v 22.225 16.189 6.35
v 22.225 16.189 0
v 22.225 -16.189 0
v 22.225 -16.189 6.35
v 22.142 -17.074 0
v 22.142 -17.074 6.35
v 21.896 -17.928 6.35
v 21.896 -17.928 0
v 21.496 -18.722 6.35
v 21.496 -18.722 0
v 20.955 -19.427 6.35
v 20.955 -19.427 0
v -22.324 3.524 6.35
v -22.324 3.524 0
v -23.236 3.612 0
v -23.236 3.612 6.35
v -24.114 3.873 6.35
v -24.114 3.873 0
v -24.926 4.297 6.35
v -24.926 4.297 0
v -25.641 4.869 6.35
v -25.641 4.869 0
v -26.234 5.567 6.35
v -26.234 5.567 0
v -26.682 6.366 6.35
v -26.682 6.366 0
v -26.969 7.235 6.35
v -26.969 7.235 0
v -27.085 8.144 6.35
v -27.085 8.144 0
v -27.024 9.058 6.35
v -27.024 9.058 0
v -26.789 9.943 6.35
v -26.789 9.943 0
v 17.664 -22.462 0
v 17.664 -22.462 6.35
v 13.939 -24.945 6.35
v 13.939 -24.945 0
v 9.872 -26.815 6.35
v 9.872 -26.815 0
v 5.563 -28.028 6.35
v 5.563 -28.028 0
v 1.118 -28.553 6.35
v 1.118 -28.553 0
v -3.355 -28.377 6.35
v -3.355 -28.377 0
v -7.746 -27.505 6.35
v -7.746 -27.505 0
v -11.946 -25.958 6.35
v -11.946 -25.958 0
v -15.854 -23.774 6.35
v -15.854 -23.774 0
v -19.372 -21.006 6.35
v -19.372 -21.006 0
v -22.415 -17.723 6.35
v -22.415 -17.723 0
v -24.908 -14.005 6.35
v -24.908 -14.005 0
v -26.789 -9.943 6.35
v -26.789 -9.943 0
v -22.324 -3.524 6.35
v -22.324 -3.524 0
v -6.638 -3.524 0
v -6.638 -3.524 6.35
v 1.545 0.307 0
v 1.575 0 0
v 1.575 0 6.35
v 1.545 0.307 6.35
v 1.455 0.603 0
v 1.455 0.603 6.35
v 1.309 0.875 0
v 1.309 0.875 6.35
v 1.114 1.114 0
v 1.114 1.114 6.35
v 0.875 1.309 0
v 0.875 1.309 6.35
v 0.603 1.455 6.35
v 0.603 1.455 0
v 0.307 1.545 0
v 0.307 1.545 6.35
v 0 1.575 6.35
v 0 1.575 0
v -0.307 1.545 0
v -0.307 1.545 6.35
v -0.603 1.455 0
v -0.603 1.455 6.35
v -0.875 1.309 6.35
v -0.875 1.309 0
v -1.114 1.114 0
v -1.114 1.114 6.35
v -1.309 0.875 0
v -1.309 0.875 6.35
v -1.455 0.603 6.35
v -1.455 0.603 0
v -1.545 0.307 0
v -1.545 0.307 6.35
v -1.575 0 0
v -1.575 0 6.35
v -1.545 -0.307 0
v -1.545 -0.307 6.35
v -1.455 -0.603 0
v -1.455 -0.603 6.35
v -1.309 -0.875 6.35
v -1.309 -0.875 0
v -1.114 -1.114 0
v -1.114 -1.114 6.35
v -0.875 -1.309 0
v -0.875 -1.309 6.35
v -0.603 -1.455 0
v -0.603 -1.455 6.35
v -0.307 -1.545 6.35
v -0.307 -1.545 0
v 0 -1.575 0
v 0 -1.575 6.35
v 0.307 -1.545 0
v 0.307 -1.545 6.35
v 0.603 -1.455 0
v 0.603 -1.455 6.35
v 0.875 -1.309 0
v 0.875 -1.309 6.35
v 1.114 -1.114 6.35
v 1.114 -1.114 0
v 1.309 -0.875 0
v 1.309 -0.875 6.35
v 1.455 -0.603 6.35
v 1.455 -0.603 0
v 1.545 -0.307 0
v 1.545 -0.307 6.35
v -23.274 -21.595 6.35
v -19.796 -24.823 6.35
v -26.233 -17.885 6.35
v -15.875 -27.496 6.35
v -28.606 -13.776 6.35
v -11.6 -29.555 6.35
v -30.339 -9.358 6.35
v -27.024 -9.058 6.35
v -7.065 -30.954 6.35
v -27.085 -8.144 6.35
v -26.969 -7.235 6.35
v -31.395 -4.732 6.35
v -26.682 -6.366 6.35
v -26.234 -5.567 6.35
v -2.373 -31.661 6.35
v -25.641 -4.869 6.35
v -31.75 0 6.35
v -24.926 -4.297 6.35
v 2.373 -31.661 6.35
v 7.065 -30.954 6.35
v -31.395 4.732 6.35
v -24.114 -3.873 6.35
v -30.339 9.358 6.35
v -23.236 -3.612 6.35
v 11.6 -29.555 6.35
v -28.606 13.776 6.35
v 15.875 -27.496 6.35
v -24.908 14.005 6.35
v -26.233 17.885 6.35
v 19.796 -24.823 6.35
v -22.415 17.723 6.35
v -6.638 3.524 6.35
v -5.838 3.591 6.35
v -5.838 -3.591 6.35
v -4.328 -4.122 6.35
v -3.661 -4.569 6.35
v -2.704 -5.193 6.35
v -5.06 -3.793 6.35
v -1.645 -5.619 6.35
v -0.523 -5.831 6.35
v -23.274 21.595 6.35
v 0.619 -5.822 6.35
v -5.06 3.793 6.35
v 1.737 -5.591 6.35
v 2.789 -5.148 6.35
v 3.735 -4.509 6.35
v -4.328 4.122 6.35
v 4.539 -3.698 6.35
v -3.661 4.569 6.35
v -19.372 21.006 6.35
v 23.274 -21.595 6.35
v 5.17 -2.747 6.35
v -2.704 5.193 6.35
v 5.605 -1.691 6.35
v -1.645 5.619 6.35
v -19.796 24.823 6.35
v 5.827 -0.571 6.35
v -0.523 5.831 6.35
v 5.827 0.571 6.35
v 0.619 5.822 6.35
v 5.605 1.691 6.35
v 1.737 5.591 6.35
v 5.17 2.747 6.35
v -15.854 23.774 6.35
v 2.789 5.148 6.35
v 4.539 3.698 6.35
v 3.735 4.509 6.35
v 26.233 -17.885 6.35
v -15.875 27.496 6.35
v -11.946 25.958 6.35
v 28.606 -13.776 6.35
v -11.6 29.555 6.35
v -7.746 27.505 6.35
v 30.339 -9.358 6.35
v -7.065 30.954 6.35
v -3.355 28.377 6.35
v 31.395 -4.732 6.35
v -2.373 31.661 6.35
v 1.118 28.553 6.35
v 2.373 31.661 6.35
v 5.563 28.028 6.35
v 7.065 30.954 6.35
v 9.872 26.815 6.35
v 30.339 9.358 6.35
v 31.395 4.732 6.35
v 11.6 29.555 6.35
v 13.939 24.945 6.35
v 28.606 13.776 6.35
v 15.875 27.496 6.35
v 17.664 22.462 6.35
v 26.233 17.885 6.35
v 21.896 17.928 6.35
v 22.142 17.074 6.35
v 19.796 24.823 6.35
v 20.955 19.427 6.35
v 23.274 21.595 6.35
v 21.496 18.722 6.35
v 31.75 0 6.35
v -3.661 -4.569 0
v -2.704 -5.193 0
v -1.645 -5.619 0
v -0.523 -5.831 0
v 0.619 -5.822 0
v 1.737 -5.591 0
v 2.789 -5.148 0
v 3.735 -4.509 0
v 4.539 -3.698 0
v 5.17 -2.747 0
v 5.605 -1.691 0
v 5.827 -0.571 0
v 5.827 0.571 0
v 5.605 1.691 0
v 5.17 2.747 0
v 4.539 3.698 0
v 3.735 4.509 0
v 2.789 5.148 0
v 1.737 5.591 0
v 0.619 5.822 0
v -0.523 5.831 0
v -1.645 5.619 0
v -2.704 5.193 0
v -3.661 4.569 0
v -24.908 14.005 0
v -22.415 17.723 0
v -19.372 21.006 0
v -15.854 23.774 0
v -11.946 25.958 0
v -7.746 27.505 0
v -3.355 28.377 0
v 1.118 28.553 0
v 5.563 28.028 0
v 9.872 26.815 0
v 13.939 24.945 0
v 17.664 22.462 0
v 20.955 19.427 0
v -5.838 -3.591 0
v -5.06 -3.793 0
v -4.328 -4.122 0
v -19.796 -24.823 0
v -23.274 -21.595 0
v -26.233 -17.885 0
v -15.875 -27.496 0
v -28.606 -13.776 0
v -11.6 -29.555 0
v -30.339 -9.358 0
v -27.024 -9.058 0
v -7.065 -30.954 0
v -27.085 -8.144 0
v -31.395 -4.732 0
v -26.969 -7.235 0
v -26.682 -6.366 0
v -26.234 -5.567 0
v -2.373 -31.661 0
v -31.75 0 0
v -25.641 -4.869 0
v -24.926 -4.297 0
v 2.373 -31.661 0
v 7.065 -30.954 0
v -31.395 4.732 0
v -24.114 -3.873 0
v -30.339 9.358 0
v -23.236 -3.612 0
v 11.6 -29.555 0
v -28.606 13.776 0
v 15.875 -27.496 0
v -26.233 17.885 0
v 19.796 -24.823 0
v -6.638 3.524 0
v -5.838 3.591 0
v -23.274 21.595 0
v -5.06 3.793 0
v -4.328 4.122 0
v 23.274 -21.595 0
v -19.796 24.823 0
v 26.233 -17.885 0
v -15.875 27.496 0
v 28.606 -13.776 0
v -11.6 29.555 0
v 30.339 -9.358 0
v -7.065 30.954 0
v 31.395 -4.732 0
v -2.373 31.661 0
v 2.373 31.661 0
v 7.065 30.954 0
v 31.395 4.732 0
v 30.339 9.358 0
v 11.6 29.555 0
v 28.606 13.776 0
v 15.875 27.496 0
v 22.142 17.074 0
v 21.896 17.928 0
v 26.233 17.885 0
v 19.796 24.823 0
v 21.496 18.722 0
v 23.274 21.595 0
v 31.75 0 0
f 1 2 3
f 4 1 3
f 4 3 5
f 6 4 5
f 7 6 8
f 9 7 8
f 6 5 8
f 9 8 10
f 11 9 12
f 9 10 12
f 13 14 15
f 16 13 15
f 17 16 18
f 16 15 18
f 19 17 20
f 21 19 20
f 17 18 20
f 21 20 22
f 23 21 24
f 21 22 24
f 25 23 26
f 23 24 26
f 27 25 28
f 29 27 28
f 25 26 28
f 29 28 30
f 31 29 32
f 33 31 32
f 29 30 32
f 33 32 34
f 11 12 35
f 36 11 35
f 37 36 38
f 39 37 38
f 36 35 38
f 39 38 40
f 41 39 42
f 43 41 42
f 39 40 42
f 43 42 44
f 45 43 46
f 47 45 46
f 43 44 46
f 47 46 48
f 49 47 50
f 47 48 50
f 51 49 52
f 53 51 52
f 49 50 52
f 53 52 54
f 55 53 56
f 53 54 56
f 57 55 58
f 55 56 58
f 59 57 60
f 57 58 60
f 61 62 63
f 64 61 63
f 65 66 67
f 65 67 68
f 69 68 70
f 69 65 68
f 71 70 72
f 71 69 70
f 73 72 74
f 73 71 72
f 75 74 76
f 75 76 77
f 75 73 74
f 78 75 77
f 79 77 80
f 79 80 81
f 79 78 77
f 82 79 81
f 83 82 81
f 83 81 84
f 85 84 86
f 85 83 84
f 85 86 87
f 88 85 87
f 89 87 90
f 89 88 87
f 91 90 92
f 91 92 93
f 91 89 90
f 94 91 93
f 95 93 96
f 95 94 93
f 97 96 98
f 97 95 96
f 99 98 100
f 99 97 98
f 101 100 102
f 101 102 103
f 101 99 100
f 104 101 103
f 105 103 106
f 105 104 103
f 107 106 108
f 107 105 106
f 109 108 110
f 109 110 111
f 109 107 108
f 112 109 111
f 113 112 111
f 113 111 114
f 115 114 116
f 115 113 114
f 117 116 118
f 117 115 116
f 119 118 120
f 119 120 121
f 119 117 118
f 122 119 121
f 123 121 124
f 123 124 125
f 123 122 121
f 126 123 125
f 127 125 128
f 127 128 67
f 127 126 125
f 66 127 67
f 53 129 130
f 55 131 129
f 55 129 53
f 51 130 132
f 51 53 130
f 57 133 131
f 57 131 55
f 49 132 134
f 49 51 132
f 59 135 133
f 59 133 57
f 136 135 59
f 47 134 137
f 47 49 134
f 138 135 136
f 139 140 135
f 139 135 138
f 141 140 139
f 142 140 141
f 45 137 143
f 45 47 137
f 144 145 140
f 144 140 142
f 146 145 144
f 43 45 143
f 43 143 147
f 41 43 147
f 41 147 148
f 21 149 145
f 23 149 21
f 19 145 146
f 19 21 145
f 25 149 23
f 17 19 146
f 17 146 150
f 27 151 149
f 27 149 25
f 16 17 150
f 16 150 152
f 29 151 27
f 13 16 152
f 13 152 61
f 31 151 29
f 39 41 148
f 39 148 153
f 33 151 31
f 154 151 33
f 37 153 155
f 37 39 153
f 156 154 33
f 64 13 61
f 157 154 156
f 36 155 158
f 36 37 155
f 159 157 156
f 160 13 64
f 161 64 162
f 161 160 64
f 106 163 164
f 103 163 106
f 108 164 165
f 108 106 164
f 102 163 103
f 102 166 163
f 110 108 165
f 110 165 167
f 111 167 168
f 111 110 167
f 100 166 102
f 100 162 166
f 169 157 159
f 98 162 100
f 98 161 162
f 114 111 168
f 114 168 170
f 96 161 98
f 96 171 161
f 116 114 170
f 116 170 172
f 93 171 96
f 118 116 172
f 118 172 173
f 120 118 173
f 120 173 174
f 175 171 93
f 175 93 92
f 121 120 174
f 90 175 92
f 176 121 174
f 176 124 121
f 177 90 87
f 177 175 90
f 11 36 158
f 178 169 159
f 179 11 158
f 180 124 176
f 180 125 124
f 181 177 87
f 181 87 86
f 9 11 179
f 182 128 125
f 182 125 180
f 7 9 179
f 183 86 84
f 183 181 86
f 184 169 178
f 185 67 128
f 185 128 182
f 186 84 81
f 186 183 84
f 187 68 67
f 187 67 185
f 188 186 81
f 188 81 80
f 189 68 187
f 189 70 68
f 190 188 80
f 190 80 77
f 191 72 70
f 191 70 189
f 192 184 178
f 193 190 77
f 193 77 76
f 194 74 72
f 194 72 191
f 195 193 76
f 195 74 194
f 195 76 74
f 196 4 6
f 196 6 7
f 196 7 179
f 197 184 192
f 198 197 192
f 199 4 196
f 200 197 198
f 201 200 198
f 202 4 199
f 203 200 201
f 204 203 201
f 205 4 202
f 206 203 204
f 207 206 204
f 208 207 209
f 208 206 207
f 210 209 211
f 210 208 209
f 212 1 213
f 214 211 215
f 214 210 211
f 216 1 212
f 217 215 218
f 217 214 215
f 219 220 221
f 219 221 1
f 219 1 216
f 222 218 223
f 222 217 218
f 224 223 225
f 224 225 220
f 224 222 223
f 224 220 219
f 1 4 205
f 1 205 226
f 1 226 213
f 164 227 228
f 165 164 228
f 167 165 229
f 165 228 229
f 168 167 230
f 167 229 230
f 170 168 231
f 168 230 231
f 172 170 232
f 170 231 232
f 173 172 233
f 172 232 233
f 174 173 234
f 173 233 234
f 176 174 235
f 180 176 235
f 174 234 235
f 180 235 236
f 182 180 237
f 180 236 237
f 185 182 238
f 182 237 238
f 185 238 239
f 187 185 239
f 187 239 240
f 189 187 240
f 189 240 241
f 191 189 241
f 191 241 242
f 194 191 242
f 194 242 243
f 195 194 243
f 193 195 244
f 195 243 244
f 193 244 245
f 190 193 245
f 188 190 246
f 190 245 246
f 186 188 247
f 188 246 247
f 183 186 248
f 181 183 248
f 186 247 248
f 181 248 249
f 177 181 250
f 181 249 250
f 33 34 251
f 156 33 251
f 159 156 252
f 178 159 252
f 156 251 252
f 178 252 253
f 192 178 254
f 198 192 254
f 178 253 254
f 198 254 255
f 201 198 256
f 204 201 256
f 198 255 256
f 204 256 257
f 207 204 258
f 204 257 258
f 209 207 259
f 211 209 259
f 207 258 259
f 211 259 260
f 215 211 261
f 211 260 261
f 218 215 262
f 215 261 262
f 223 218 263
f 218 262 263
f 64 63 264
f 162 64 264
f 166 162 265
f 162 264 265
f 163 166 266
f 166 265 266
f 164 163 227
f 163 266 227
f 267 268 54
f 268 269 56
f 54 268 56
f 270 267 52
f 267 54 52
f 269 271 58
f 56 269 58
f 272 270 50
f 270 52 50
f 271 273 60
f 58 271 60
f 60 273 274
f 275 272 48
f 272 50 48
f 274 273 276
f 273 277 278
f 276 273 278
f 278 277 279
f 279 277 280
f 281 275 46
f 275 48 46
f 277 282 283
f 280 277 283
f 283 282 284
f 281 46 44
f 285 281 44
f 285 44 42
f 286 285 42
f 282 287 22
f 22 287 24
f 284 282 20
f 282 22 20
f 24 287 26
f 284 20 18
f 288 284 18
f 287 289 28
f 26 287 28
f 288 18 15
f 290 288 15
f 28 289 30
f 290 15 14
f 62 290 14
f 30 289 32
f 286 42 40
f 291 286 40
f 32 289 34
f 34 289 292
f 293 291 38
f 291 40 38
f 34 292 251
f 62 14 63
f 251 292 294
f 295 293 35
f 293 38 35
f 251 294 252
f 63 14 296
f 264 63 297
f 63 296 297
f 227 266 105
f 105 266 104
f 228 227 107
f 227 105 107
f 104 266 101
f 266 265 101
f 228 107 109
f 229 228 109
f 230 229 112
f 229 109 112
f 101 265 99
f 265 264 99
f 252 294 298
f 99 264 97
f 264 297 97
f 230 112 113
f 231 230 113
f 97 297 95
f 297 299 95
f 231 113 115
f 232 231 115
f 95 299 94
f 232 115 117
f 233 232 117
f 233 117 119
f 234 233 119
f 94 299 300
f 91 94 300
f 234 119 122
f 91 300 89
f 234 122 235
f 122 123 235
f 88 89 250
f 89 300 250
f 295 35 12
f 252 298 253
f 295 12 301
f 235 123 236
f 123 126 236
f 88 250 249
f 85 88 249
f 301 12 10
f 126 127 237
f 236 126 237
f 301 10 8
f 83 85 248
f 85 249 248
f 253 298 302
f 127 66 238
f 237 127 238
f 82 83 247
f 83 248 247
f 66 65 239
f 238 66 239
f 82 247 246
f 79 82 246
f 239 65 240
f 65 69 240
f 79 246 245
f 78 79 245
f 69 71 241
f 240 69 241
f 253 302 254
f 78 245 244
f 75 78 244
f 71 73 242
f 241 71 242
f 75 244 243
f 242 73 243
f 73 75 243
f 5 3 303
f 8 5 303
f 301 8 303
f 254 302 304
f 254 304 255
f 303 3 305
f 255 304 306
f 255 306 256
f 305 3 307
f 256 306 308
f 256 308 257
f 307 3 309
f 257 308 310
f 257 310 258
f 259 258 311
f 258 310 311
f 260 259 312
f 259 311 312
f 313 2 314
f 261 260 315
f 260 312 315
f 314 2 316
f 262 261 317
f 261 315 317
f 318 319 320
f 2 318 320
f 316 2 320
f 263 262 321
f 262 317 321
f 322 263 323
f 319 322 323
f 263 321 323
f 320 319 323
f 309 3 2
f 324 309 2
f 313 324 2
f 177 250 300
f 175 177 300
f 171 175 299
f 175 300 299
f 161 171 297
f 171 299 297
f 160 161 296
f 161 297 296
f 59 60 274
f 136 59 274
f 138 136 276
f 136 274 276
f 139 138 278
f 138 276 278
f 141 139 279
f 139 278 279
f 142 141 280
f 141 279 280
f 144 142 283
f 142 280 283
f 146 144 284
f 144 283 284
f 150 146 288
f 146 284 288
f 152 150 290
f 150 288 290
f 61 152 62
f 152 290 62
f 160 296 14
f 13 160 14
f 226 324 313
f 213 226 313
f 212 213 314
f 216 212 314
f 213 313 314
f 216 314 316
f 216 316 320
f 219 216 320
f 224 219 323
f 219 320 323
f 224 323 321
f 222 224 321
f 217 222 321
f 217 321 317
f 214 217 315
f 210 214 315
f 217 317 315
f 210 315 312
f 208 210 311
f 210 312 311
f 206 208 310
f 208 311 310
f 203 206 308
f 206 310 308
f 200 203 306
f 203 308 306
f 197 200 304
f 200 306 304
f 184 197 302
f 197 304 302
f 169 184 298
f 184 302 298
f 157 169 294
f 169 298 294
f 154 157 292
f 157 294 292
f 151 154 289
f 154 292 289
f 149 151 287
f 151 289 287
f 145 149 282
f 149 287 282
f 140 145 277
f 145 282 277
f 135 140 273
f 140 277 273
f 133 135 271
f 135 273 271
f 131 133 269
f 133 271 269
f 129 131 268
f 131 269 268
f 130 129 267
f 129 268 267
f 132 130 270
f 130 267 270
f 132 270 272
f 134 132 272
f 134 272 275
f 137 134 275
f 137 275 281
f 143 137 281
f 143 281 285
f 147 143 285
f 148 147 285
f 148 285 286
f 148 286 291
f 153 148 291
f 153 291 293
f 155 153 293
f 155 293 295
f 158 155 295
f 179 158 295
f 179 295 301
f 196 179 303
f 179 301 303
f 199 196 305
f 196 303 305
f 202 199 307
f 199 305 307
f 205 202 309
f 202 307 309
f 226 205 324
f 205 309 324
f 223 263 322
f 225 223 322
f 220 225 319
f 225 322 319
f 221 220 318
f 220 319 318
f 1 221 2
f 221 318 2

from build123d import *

# Parameters (mm, degrees)
F0_R     = 31.75
F0_R_2   = 1.5748
F1_DEPTH = 6.35


with BuildPart() as f1:
    # F0 (on Top) → F1 (new body)
    with BuildSketch(Plane.XY):
        Circle(F0_R)
        with BuildLine():
            ThreePointArc((20.955, -19.427264), (-5.567411, -28.027389), (-26.789215, -9.943267))
            ThreePointArc((-26.789215, -9.943267), (-26.234197, -5.566779), (-22.324346, -3.523556))
            Line((-22.324346, -3.523556), (-6.638238, -3.523556))
            ThreePointArc((-6.638238, -3.523556), (-5.060266, -3.792571), (-3.66056, -4.569225))
            ThreePointArc((-3.66056, -4.569225), (5.8547, 0), (-3.66056, 4.569225))
            ThreePointArc((-3.66056, 4.569225), (-5.060266, 3.792571), (-6.638238, 3.523556))
            Line((-6.638238, 3.523556), (-22.324346, 3.523556))
            ThreePointArc((-22.324346, 3.523556), (-26.234197, 5.566779), (-26.789215, 9.943267))
            ThreePointArc((-26.789215, 9.943267), (-5.567411, 28.027389), (20.955, 19.427264))
            ThreePointArc((20.955, 19.427264), (21.896146, 17.928406), (22.225, 16.189387))
            Line((22.225, 16.189387), (22.225, 0))
            Line((22.225, 0), (22.225, -16.189387))
            ThreePointArc((22.225, -16.189387), (21.896146, -17.928406), (20.955, -19.427264))
        make_face(mode=Mode.SUBTRACT)
        Circle(F0_R_2, mode=Mode.SUBTRACT)
    extrude(amount=F1_DEPTH)


solid = f1.part
